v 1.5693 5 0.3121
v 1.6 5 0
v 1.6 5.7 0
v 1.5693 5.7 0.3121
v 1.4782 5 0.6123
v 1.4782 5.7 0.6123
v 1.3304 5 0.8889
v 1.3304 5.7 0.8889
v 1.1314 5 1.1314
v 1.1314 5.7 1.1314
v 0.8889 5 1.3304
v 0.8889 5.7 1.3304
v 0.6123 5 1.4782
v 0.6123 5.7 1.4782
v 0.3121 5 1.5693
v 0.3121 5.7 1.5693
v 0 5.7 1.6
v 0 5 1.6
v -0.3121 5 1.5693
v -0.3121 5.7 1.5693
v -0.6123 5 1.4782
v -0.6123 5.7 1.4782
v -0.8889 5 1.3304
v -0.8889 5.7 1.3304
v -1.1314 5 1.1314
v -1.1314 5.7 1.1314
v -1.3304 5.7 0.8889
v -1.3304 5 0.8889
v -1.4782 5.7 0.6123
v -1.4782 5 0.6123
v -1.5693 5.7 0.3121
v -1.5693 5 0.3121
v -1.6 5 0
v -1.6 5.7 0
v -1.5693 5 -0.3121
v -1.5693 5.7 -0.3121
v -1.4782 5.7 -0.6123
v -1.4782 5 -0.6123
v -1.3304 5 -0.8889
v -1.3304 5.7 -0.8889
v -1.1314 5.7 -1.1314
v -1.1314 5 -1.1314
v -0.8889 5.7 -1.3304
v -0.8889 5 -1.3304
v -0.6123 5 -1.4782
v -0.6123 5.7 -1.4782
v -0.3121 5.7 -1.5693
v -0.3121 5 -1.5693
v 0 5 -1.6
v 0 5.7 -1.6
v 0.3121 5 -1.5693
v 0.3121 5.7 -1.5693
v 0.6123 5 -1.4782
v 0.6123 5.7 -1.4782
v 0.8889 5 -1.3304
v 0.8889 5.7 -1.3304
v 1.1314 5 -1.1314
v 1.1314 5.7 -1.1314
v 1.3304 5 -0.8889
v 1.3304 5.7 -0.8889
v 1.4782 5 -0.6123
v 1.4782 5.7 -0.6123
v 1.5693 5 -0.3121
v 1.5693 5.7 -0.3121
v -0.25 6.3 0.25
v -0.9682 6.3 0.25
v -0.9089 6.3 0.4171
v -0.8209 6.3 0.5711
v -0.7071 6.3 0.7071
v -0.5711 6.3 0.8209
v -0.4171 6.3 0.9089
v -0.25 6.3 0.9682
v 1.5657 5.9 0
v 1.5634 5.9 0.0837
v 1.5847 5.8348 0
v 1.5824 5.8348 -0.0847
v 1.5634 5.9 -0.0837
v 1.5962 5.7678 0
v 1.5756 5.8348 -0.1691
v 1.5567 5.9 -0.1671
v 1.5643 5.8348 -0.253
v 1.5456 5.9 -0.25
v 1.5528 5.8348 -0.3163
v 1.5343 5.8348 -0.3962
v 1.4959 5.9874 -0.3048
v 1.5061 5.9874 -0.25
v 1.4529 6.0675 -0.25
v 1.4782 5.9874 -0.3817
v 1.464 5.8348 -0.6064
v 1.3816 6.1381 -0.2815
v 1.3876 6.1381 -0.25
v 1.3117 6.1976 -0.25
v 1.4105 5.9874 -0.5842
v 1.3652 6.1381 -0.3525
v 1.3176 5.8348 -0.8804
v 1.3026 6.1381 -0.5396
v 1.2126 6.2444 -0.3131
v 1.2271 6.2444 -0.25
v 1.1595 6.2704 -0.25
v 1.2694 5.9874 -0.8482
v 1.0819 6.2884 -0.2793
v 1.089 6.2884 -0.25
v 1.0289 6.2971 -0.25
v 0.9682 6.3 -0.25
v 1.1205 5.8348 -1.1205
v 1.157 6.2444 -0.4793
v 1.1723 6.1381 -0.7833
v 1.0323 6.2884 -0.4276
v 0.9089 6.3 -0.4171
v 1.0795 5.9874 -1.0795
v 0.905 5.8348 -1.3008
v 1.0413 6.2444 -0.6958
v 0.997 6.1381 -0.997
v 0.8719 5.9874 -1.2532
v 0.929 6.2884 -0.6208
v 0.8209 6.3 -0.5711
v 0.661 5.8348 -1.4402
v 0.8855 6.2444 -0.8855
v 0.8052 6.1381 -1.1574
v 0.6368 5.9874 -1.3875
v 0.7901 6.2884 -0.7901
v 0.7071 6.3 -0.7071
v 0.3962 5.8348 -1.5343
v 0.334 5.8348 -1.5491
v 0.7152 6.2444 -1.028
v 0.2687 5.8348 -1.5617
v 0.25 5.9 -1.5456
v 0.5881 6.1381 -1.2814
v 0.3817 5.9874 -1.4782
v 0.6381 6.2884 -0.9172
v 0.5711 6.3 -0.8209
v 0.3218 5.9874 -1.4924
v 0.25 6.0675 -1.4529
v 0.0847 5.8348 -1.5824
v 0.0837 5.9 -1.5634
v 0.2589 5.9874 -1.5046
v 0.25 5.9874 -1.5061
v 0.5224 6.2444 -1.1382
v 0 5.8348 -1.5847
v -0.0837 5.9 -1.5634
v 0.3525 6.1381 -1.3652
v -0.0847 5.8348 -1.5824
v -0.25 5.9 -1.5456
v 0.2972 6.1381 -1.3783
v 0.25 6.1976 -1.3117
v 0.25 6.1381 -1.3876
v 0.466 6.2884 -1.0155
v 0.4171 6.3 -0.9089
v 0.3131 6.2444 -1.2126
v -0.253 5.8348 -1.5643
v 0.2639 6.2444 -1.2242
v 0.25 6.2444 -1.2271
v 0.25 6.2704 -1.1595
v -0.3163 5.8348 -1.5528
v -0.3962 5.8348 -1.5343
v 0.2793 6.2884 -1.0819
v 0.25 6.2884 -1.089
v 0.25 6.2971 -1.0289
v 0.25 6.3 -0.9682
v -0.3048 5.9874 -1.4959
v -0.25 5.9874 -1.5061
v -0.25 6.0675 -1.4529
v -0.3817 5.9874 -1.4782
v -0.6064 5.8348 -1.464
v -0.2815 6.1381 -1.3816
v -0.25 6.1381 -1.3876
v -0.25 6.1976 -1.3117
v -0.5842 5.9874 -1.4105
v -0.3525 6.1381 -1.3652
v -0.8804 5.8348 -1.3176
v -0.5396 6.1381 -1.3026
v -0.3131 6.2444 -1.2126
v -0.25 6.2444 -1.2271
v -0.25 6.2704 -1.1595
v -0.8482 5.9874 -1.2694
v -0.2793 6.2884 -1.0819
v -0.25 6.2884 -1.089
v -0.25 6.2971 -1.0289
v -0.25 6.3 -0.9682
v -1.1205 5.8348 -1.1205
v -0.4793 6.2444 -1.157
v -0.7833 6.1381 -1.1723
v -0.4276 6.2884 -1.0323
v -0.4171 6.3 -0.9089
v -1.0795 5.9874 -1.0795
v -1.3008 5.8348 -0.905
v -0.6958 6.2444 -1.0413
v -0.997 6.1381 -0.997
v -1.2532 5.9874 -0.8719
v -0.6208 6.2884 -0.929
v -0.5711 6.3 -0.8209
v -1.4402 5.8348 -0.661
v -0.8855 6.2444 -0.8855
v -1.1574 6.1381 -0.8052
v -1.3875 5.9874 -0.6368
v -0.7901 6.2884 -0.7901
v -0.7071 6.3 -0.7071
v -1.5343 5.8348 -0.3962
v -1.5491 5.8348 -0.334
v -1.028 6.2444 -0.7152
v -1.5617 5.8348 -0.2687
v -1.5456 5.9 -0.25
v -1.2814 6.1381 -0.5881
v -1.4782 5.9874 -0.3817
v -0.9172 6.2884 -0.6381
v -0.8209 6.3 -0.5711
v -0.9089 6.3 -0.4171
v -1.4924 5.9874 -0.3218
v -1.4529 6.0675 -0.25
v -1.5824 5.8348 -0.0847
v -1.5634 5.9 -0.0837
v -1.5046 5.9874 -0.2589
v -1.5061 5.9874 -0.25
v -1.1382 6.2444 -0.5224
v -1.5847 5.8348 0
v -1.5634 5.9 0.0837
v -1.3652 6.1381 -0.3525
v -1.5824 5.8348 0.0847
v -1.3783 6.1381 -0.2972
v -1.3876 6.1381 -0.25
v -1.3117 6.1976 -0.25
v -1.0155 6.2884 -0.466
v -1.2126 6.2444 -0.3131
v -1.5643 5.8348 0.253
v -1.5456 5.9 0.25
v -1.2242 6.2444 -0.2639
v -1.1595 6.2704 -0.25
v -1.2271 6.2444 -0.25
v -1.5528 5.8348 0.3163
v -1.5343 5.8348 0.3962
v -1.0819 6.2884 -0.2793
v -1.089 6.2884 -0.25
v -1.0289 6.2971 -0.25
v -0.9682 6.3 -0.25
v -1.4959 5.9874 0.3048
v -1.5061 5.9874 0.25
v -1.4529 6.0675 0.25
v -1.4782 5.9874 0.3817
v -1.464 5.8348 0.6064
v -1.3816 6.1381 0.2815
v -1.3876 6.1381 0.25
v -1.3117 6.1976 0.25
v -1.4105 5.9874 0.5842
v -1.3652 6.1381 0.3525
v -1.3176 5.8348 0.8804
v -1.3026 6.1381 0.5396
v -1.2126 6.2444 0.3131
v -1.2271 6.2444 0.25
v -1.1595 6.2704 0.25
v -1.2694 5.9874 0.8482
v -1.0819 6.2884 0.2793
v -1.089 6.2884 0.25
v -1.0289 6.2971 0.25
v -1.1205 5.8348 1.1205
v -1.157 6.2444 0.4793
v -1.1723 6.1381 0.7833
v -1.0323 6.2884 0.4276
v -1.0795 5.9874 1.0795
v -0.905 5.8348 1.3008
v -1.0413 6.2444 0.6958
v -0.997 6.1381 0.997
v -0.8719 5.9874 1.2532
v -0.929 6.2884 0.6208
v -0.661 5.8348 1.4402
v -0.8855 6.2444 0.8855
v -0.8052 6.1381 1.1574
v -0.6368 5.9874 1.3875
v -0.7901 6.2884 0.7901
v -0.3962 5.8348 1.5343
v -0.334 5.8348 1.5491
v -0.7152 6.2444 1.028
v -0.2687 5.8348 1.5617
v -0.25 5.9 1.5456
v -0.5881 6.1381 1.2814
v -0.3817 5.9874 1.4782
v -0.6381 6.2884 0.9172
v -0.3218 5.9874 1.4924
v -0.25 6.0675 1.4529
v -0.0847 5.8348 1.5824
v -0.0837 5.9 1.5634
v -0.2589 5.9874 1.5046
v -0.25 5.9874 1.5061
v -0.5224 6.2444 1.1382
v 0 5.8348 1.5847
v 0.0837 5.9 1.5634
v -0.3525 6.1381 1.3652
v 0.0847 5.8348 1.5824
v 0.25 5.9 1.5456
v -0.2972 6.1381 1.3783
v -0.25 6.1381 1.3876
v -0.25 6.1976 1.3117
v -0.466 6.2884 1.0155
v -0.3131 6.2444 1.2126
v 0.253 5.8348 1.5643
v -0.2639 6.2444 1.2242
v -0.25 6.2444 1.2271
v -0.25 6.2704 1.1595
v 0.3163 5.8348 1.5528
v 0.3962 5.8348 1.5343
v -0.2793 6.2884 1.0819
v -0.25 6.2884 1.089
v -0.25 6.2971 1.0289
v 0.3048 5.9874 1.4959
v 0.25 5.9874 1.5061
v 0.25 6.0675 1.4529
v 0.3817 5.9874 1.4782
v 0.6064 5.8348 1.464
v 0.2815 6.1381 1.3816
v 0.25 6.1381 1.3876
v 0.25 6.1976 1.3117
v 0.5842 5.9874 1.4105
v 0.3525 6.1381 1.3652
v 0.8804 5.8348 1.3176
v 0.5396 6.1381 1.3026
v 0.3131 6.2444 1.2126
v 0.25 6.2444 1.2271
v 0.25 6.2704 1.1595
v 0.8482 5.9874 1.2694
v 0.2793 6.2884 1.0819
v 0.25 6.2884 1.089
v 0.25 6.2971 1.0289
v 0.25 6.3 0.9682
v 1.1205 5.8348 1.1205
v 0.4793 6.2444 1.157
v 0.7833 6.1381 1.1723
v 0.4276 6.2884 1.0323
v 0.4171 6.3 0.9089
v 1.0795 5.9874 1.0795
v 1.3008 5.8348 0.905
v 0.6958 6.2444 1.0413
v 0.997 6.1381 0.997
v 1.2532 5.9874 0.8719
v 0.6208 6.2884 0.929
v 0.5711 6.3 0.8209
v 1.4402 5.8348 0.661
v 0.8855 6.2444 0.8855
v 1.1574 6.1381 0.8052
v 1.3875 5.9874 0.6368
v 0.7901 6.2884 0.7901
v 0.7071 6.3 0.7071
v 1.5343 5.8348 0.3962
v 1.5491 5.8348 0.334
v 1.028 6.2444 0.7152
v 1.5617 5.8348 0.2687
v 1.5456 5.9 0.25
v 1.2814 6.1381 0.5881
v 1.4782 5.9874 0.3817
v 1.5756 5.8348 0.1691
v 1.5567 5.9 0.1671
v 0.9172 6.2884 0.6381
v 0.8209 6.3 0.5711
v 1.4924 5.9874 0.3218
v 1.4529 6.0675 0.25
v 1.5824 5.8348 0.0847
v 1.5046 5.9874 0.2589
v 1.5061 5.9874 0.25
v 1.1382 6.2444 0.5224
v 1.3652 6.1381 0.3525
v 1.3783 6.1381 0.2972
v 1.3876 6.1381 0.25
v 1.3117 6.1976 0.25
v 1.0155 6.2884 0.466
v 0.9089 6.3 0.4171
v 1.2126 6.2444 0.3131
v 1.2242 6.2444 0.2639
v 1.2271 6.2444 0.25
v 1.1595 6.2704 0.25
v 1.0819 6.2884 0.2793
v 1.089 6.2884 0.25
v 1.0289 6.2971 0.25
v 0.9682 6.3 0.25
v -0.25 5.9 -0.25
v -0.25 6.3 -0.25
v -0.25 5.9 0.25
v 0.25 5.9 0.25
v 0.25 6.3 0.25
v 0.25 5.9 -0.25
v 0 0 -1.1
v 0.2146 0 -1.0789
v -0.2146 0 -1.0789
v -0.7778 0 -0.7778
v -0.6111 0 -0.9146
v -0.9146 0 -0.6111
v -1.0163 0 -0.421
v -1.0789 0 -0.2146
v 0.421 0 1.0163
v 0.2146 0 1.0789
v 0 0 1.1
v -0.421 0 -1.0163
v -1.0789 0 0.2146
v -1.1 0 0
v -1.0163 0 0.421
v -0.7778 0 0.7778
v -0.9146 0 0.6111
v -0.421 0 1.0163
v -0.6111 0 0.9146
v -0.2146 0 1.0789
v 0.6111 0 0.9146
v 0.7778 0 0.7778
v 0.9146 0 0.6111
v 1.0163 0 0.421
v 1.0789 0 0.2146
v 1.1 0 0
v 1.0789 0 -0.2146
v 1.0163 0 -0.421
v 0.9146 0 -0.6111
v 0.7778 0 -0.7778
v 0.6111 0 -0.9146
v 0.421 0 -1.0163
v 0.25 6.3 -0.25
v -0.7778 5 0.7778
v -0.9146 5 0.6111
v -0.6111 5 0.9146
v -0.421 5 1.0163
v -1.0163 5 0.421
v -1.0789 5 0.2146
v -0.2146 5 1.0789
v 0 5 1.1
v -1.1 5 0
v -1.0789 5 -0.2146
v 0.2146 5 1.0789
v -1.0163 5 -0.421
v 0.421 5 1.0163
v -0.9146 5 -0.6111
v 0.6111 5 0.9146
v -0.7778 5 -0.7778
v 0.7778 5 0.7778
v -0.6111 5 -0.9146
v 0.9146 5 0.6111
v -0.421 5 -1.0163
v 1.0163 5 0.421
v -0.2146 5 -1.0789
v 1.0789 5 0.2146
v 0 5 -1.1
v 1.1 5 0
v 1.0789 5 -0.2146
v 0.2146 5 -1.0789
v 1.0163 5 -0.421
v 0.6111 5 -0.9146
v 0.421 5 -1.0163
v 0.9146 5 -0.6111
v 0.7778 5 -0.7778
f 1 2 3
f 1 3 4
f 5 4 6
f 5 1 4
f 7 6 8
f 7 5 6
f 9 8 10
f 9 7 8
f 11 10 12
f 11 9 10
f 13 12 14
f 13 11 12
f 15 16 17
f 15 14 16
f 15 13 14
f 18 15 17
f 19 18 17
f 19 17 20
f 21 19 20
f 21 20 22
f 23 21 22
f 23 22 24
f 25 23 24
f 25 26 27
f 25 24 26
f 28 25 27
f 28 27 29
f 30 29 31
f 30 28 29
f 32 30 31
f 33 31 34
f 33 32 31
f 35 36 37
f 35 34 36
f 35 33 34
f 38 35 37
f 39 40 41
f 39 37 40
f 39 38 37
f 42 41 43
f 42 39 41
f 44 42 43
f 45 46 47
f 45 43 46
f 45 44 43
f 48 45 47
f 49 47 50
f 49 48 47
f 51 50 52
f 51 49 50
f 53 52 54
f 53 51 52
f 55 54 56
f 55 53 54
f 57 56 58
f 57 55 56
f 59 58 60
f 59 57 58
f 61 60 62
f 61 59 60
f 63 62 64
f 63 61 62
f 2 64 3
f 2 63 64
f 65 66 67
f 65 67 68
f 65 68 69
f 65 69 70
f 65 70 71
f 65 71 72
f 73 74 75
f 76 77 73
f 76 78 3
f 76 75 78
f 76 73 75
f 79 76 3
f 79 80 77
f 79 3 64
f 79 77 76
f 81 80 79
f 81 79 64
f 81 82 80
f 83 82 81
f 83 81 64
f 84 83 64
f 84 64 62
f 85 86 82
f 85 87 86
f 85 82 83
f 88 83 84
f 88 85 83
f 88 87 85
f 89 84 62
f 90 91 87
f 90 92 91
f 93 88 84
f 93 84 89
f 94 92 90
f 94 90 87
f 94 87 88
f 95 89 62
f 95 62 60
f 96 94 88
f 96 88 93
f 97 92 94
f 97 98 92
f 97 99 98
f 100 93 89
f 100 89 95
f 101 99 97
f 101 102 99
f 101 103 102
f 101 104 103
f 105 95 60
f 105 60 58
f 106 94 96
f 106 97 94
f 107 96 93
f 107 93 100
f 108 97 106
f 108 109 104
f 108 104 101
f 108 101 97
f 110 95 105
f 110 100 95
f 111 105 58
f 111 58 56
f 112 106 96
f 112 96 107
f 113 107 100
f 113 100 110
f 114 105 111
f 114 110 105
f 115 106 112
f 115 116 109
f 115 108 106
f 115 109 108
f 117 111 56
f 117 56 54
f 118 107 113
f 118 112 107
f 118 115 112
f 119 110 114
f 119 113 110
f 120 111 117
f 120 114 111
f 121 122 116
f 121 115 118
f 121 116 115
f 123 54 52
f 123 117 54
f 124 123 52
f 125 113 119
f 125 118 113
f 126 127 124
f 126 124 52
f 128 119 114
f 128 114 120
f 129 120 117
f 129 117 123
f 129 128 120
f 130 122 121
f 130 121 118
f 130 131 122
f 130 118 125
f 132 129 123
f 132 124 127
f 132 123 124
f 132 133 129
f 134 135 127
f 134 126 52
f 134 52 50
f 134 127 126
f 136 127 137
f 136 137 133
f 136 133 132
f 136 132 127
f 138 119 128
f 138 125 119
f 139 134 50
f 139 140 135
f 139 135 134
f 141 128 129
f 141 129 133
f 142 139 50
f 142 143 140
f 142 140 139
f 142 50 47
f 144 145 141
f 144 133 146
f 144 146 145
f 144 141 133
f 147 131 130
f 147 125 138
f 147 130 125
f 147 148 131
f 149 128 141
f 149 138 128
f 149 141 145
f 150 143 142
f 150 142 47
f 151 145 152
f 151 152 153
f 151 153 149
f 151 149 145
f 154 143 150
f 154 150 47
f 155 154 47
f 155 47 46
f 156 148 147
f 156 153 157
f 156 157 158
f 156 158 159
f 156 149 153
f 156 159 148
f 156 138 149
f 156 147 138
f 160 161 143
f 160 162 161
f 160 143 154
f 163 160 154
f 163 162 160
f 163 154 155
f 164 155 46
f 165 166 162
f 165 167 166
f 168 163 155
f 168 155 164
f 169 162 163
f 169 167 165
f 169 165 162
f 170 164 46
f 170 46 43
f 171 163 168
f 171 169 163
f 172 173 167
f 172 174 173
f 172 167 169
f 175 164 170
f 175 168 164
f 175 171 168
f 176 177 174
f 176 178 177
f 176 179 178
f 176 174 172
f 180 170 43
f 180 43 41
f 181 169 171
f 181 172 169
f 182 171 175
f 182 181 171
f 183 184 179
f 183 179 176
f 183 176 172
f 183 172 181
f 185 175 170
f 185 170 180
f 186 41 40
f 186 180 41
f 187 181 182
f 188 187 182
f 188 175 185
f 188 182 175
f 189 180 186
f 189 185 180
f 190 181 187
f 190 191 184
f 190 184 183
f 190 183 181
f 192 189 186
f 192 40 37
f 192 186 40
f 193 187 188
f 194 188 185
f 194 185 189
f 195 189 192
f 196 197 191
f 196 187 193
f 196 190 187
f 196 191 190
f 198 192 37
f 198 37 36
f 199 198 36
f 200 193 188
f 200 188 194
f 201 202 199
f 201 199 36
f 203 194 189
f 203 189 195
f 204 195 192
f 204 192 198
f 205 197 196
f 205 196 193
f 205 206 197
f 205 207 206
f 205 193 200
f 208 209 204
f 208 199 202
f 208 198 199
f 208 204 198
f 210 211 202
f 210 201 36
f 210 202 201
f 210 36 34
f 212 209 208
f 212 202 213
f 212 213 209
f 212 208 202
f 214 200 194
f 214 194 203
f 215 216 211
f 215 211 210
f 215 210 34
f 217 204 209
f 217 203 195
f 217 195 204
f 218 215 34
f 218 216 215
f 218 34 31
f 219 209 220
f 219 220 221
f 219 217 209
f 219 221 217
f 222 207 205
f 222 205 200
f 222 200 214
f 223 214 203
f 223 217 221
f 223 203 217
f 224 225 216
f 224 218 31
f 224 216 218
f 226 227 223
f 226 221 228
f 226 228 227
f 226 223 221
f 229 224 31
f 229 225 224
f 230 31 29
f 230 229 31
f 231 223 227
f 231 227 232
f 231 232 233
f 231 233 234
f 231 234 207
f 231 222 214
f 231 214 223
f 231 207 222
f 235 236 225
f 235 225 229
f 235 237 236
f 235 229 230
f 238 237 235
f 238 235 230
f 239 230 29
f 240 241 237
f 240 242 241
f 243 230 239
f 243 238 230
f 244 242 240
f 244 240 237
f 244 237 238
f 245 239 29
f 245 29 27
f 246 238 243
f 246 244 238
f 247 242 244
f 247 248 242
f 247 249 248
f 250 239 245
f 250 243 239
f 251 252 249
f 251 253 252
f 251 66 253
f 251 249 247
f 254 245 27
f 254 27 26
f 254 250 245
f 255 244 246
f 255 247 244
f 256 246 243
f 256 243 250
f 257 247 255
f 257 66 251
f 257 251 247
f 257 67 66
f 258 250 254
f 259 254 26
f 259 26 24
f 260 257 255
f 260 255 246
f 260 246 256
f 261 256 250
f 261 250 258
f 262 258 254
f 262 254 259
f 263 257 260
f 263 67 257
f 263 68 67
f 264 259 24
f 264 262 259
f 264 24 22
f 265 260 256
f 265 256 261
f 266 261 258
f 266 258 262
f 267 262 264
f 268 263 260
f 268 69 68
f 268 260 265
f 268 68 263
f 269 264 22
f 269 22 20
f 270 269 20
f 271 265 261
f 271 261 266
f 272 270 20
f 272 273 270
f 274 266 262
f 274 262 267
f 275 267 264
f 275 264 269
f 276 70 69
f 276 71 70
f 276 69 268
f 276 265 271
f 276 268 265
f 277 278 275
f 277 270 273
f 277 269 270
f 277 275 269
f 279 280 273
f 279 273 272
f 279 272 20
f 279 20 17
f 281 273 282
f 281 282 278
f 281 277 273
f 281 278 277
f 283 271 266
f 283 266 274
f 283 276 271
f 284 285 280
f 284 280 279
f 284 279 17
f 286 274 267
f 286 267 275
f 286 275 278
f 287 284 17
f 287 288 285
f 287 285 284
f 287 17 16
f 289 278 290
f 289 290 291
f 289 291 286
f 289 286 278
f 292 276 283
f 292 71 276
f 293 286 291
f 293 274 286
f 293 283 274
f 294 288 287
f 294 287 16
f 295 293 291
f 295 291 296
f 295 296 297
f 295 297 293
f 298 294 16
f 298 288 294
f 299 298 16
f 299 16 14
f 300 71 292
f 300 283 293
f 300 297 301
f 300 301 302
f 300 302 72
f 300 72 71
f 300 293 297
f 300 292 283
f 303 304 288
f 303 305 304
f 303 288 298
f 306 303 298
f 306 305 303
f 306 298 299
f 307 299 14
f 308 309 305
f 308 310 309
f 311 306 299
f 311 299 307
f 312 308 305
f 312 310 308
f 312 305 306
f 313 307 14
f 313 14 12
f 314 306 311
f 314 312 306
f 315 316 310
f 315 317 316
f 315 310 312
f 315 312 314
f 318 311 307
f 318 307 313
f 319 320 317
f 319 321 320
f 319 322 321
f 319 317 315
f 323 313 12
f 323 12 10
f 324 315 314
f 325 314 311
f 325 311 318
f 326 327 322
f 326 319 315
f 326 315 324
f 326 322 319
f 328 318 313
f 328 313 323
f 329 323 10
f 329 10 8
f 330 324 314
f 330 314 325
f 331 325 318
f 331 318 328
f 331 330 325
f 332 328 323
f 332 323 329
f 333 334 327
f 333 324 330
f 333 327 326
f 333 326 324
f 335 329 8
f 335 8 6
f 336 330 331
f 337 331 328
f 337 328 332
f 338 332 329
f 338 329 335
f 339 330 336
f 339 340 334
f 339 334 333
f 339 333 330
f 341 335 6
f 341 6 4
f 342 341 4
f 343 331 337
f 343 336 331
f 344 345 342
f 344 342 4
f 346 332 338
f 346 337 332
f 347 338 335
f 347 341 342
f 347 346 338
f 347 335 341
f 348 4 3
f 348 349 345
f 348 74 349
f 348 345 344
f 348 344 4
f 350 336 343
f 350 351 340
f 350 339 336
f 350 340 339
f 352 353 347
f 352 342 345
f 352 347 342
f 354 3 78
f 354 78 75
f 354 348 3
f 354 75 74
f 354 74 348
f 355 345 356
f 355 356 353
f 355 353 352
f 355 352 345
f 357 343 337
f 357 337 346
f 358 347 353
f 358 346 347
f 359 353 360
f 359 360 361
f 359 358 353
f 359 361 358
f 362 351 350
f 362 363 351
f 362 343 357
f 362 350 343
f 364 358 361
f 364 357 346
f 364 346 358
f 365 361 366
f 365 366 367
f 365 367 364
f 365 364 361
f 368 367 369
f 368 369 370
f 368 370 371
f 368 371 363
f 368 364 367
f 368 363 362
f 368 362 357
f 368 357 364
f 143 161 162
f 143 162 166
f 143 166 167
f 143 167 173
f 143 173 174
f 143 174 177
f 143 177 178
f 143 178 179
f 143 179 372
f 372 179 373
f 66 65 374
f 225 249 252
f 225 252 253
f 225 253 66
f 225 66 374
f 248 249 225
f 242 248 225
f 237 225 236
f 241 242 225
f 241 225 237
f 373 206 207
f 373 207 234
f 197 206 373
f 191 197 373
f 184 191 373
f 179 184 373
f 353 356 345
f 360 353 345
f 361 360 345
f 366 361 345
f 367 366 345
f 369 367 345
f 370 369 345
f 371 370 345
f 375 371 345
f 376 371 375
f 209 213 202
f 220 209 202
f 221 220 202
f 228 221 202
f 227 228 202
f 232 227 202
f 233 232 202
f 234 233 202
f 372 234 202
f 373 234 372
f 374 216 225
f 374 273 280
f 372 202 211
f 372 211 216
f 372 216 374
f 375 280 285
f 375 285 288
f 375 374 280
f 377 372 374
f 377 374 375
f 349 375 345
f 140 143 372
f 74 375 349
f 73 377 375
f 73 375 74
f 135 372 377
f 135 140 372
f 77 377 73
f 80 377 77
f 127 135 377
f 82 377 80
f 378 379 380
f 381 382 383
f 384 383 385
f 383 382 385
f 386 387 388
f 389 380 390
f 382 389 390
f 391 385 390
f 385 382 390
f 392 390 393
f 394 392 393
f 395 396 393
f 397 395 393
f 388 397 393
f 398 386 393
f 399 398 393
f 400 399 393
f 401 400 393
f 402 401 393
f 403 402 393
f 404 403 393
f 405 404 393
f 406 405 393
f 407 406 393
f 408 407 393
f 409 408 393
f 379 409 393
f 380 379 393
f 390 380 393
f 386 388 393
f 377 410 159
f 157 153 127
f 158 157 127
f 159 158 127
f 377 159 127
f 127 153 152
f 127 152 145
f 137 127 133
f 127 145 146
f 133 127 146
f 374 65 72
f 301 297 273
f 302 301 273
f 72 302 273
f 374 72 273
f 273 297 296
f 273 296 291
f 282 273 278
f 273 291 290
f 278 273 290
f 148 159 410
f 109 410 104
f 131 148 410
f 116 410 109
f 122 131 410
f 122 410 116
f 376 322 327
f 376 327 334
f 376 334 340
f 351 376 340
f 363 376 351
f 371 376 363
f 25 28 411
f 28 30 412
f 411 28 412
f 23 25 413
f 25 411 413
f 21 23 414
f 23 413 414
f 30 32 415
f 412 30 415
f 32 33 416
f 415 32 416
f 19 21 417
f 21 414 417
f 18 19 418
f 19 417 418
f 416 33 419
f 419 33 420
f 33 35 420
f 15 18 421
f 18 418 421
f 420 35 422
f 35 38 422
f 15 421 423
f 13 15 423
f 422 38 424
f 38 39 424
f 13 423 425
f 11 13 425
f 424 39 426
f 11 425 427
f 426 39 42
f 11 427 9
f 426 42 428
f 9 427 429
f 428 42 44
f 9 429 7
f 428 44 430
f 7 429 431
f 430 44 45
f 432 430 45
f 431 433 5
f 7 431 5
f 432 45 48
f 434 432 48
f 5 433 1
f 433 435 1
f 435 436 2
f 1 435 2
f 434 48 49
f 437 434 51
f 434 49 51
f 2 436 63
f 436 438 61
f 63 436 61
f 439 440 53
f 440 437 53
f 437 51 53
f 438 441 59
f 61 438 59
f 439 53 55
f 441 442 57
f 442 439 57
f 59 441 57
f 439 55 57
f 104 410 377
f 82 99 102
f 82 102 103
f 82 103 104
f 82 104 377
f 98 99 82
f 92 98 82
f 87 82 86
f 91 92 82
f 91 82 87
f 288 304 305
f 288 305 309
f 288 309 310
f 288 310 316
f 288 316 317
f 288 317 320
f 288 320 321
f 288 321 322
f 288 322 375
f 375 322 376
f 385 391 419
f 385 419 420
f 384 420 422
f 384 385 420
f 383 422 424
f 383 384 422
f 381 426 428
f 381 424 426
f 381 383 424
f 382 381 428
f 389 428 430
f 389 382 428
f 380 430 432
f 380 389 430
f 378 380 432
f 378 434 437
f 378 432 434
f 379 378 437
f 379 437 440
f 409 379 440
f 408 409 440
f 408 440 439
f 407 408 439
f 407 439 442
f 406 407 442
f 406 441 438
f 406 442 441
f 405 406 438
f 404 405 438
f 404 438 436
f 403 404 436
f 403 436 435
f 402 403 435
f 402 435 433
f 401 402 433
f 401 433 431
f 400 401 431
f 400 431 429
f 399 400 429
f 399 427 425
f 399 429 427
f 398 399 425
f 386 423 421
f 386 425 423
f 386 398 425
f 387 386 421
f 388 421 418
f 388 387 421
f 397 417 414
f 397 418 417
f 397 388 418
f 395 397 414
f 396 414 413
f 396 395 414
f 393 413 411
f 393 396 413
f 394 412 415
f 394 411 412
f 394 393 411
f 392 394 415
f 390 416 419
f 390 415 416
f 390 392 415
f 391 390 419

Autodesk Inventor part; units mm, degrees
ref_plane "YZ Plane" through (0, 0, 0) normal (1, 0, 0) x (0, 1, 0)
ref_plane "XZ Plane" through (0, 0, 0) normal (0, 1, 0) x (-1, 0, 0)
ref_plane "XY Plane" through (0, 0, 0) normal (0, 0, 1) x (1, 0, 0)
sketch "Sketch1" plane through (0, 0, 0) normal (0, 1, 0) x (-1, 0, 0)
  circle A0 centre (0, 0) radius 1.1
  dimension "d0" = 2.2
extrude "Extrusion1" add sketch "Sketch1" along normal blind 5
sketch "Sketch2" plane through (0, 5, 0) normal (0, 1, 0) x (1, 0, 0)
  circle A0 centre (0, 0) radius 1.6
  dimension "d3" = 3.2
extrude "Extrusion2" add sketch "Sketch2" along normal blind 1.3
fillet "Fillet1" radius 0.6 1 edges at (-1.6, 6.3, 0)
sketch "Sketch3" plane through (0, 6.3, 0) normal (0, 1, 0) x (1, 0, 0)
  line L0 (0.25, 2.5) -> (-0.25, 2.5)
  line L1 (-0.25, 2.5) -> (-0.25, -2.5)
  line L2 (-0.25, -2.5) -> (0.25, -2.5)
  line L3 (0.25, -2.5) -> (0.25, 2.5)
  line L4 (0.25, 2.5) -> (-0.25, -2.5) construction
  line L5 (-0.25, 2.5) -> (0.25, -2.5) construction
  line L6 (2.5, 0.25) -> (2.5, -0.25)
  line L7 (2.5, -0.25) -> (-2.5, -0.25)
  line L8 (-2.5, -0.25) -> (-2.5, 0.25)
  line L9 (-2.5, 0.25) -> (2.5, 0.25)
  line L10 (2.5, 0.25) -> (-2.5, -0.25) construction
  line L11 (2.5, -0.25) -> (-2.5, 0.25) construction
  line L12 (2.5, 0.25) -> (3, 0.25) construction
  point P0 (0, 0)
  dimension "d9" = 0.5
  dimension "d10" = 5
  dimension "d11" = 0.5
  dimension "d12" = 90
  dimension "d13" = 5
extrude "Extrusion3" cut sketch "Sketch3" against normal blind 0.4
thread "Thread2" size "M2.2x0.45" class "6g" standard "ANSI Metric M Profile" full length
properties part number "8mm M3"
